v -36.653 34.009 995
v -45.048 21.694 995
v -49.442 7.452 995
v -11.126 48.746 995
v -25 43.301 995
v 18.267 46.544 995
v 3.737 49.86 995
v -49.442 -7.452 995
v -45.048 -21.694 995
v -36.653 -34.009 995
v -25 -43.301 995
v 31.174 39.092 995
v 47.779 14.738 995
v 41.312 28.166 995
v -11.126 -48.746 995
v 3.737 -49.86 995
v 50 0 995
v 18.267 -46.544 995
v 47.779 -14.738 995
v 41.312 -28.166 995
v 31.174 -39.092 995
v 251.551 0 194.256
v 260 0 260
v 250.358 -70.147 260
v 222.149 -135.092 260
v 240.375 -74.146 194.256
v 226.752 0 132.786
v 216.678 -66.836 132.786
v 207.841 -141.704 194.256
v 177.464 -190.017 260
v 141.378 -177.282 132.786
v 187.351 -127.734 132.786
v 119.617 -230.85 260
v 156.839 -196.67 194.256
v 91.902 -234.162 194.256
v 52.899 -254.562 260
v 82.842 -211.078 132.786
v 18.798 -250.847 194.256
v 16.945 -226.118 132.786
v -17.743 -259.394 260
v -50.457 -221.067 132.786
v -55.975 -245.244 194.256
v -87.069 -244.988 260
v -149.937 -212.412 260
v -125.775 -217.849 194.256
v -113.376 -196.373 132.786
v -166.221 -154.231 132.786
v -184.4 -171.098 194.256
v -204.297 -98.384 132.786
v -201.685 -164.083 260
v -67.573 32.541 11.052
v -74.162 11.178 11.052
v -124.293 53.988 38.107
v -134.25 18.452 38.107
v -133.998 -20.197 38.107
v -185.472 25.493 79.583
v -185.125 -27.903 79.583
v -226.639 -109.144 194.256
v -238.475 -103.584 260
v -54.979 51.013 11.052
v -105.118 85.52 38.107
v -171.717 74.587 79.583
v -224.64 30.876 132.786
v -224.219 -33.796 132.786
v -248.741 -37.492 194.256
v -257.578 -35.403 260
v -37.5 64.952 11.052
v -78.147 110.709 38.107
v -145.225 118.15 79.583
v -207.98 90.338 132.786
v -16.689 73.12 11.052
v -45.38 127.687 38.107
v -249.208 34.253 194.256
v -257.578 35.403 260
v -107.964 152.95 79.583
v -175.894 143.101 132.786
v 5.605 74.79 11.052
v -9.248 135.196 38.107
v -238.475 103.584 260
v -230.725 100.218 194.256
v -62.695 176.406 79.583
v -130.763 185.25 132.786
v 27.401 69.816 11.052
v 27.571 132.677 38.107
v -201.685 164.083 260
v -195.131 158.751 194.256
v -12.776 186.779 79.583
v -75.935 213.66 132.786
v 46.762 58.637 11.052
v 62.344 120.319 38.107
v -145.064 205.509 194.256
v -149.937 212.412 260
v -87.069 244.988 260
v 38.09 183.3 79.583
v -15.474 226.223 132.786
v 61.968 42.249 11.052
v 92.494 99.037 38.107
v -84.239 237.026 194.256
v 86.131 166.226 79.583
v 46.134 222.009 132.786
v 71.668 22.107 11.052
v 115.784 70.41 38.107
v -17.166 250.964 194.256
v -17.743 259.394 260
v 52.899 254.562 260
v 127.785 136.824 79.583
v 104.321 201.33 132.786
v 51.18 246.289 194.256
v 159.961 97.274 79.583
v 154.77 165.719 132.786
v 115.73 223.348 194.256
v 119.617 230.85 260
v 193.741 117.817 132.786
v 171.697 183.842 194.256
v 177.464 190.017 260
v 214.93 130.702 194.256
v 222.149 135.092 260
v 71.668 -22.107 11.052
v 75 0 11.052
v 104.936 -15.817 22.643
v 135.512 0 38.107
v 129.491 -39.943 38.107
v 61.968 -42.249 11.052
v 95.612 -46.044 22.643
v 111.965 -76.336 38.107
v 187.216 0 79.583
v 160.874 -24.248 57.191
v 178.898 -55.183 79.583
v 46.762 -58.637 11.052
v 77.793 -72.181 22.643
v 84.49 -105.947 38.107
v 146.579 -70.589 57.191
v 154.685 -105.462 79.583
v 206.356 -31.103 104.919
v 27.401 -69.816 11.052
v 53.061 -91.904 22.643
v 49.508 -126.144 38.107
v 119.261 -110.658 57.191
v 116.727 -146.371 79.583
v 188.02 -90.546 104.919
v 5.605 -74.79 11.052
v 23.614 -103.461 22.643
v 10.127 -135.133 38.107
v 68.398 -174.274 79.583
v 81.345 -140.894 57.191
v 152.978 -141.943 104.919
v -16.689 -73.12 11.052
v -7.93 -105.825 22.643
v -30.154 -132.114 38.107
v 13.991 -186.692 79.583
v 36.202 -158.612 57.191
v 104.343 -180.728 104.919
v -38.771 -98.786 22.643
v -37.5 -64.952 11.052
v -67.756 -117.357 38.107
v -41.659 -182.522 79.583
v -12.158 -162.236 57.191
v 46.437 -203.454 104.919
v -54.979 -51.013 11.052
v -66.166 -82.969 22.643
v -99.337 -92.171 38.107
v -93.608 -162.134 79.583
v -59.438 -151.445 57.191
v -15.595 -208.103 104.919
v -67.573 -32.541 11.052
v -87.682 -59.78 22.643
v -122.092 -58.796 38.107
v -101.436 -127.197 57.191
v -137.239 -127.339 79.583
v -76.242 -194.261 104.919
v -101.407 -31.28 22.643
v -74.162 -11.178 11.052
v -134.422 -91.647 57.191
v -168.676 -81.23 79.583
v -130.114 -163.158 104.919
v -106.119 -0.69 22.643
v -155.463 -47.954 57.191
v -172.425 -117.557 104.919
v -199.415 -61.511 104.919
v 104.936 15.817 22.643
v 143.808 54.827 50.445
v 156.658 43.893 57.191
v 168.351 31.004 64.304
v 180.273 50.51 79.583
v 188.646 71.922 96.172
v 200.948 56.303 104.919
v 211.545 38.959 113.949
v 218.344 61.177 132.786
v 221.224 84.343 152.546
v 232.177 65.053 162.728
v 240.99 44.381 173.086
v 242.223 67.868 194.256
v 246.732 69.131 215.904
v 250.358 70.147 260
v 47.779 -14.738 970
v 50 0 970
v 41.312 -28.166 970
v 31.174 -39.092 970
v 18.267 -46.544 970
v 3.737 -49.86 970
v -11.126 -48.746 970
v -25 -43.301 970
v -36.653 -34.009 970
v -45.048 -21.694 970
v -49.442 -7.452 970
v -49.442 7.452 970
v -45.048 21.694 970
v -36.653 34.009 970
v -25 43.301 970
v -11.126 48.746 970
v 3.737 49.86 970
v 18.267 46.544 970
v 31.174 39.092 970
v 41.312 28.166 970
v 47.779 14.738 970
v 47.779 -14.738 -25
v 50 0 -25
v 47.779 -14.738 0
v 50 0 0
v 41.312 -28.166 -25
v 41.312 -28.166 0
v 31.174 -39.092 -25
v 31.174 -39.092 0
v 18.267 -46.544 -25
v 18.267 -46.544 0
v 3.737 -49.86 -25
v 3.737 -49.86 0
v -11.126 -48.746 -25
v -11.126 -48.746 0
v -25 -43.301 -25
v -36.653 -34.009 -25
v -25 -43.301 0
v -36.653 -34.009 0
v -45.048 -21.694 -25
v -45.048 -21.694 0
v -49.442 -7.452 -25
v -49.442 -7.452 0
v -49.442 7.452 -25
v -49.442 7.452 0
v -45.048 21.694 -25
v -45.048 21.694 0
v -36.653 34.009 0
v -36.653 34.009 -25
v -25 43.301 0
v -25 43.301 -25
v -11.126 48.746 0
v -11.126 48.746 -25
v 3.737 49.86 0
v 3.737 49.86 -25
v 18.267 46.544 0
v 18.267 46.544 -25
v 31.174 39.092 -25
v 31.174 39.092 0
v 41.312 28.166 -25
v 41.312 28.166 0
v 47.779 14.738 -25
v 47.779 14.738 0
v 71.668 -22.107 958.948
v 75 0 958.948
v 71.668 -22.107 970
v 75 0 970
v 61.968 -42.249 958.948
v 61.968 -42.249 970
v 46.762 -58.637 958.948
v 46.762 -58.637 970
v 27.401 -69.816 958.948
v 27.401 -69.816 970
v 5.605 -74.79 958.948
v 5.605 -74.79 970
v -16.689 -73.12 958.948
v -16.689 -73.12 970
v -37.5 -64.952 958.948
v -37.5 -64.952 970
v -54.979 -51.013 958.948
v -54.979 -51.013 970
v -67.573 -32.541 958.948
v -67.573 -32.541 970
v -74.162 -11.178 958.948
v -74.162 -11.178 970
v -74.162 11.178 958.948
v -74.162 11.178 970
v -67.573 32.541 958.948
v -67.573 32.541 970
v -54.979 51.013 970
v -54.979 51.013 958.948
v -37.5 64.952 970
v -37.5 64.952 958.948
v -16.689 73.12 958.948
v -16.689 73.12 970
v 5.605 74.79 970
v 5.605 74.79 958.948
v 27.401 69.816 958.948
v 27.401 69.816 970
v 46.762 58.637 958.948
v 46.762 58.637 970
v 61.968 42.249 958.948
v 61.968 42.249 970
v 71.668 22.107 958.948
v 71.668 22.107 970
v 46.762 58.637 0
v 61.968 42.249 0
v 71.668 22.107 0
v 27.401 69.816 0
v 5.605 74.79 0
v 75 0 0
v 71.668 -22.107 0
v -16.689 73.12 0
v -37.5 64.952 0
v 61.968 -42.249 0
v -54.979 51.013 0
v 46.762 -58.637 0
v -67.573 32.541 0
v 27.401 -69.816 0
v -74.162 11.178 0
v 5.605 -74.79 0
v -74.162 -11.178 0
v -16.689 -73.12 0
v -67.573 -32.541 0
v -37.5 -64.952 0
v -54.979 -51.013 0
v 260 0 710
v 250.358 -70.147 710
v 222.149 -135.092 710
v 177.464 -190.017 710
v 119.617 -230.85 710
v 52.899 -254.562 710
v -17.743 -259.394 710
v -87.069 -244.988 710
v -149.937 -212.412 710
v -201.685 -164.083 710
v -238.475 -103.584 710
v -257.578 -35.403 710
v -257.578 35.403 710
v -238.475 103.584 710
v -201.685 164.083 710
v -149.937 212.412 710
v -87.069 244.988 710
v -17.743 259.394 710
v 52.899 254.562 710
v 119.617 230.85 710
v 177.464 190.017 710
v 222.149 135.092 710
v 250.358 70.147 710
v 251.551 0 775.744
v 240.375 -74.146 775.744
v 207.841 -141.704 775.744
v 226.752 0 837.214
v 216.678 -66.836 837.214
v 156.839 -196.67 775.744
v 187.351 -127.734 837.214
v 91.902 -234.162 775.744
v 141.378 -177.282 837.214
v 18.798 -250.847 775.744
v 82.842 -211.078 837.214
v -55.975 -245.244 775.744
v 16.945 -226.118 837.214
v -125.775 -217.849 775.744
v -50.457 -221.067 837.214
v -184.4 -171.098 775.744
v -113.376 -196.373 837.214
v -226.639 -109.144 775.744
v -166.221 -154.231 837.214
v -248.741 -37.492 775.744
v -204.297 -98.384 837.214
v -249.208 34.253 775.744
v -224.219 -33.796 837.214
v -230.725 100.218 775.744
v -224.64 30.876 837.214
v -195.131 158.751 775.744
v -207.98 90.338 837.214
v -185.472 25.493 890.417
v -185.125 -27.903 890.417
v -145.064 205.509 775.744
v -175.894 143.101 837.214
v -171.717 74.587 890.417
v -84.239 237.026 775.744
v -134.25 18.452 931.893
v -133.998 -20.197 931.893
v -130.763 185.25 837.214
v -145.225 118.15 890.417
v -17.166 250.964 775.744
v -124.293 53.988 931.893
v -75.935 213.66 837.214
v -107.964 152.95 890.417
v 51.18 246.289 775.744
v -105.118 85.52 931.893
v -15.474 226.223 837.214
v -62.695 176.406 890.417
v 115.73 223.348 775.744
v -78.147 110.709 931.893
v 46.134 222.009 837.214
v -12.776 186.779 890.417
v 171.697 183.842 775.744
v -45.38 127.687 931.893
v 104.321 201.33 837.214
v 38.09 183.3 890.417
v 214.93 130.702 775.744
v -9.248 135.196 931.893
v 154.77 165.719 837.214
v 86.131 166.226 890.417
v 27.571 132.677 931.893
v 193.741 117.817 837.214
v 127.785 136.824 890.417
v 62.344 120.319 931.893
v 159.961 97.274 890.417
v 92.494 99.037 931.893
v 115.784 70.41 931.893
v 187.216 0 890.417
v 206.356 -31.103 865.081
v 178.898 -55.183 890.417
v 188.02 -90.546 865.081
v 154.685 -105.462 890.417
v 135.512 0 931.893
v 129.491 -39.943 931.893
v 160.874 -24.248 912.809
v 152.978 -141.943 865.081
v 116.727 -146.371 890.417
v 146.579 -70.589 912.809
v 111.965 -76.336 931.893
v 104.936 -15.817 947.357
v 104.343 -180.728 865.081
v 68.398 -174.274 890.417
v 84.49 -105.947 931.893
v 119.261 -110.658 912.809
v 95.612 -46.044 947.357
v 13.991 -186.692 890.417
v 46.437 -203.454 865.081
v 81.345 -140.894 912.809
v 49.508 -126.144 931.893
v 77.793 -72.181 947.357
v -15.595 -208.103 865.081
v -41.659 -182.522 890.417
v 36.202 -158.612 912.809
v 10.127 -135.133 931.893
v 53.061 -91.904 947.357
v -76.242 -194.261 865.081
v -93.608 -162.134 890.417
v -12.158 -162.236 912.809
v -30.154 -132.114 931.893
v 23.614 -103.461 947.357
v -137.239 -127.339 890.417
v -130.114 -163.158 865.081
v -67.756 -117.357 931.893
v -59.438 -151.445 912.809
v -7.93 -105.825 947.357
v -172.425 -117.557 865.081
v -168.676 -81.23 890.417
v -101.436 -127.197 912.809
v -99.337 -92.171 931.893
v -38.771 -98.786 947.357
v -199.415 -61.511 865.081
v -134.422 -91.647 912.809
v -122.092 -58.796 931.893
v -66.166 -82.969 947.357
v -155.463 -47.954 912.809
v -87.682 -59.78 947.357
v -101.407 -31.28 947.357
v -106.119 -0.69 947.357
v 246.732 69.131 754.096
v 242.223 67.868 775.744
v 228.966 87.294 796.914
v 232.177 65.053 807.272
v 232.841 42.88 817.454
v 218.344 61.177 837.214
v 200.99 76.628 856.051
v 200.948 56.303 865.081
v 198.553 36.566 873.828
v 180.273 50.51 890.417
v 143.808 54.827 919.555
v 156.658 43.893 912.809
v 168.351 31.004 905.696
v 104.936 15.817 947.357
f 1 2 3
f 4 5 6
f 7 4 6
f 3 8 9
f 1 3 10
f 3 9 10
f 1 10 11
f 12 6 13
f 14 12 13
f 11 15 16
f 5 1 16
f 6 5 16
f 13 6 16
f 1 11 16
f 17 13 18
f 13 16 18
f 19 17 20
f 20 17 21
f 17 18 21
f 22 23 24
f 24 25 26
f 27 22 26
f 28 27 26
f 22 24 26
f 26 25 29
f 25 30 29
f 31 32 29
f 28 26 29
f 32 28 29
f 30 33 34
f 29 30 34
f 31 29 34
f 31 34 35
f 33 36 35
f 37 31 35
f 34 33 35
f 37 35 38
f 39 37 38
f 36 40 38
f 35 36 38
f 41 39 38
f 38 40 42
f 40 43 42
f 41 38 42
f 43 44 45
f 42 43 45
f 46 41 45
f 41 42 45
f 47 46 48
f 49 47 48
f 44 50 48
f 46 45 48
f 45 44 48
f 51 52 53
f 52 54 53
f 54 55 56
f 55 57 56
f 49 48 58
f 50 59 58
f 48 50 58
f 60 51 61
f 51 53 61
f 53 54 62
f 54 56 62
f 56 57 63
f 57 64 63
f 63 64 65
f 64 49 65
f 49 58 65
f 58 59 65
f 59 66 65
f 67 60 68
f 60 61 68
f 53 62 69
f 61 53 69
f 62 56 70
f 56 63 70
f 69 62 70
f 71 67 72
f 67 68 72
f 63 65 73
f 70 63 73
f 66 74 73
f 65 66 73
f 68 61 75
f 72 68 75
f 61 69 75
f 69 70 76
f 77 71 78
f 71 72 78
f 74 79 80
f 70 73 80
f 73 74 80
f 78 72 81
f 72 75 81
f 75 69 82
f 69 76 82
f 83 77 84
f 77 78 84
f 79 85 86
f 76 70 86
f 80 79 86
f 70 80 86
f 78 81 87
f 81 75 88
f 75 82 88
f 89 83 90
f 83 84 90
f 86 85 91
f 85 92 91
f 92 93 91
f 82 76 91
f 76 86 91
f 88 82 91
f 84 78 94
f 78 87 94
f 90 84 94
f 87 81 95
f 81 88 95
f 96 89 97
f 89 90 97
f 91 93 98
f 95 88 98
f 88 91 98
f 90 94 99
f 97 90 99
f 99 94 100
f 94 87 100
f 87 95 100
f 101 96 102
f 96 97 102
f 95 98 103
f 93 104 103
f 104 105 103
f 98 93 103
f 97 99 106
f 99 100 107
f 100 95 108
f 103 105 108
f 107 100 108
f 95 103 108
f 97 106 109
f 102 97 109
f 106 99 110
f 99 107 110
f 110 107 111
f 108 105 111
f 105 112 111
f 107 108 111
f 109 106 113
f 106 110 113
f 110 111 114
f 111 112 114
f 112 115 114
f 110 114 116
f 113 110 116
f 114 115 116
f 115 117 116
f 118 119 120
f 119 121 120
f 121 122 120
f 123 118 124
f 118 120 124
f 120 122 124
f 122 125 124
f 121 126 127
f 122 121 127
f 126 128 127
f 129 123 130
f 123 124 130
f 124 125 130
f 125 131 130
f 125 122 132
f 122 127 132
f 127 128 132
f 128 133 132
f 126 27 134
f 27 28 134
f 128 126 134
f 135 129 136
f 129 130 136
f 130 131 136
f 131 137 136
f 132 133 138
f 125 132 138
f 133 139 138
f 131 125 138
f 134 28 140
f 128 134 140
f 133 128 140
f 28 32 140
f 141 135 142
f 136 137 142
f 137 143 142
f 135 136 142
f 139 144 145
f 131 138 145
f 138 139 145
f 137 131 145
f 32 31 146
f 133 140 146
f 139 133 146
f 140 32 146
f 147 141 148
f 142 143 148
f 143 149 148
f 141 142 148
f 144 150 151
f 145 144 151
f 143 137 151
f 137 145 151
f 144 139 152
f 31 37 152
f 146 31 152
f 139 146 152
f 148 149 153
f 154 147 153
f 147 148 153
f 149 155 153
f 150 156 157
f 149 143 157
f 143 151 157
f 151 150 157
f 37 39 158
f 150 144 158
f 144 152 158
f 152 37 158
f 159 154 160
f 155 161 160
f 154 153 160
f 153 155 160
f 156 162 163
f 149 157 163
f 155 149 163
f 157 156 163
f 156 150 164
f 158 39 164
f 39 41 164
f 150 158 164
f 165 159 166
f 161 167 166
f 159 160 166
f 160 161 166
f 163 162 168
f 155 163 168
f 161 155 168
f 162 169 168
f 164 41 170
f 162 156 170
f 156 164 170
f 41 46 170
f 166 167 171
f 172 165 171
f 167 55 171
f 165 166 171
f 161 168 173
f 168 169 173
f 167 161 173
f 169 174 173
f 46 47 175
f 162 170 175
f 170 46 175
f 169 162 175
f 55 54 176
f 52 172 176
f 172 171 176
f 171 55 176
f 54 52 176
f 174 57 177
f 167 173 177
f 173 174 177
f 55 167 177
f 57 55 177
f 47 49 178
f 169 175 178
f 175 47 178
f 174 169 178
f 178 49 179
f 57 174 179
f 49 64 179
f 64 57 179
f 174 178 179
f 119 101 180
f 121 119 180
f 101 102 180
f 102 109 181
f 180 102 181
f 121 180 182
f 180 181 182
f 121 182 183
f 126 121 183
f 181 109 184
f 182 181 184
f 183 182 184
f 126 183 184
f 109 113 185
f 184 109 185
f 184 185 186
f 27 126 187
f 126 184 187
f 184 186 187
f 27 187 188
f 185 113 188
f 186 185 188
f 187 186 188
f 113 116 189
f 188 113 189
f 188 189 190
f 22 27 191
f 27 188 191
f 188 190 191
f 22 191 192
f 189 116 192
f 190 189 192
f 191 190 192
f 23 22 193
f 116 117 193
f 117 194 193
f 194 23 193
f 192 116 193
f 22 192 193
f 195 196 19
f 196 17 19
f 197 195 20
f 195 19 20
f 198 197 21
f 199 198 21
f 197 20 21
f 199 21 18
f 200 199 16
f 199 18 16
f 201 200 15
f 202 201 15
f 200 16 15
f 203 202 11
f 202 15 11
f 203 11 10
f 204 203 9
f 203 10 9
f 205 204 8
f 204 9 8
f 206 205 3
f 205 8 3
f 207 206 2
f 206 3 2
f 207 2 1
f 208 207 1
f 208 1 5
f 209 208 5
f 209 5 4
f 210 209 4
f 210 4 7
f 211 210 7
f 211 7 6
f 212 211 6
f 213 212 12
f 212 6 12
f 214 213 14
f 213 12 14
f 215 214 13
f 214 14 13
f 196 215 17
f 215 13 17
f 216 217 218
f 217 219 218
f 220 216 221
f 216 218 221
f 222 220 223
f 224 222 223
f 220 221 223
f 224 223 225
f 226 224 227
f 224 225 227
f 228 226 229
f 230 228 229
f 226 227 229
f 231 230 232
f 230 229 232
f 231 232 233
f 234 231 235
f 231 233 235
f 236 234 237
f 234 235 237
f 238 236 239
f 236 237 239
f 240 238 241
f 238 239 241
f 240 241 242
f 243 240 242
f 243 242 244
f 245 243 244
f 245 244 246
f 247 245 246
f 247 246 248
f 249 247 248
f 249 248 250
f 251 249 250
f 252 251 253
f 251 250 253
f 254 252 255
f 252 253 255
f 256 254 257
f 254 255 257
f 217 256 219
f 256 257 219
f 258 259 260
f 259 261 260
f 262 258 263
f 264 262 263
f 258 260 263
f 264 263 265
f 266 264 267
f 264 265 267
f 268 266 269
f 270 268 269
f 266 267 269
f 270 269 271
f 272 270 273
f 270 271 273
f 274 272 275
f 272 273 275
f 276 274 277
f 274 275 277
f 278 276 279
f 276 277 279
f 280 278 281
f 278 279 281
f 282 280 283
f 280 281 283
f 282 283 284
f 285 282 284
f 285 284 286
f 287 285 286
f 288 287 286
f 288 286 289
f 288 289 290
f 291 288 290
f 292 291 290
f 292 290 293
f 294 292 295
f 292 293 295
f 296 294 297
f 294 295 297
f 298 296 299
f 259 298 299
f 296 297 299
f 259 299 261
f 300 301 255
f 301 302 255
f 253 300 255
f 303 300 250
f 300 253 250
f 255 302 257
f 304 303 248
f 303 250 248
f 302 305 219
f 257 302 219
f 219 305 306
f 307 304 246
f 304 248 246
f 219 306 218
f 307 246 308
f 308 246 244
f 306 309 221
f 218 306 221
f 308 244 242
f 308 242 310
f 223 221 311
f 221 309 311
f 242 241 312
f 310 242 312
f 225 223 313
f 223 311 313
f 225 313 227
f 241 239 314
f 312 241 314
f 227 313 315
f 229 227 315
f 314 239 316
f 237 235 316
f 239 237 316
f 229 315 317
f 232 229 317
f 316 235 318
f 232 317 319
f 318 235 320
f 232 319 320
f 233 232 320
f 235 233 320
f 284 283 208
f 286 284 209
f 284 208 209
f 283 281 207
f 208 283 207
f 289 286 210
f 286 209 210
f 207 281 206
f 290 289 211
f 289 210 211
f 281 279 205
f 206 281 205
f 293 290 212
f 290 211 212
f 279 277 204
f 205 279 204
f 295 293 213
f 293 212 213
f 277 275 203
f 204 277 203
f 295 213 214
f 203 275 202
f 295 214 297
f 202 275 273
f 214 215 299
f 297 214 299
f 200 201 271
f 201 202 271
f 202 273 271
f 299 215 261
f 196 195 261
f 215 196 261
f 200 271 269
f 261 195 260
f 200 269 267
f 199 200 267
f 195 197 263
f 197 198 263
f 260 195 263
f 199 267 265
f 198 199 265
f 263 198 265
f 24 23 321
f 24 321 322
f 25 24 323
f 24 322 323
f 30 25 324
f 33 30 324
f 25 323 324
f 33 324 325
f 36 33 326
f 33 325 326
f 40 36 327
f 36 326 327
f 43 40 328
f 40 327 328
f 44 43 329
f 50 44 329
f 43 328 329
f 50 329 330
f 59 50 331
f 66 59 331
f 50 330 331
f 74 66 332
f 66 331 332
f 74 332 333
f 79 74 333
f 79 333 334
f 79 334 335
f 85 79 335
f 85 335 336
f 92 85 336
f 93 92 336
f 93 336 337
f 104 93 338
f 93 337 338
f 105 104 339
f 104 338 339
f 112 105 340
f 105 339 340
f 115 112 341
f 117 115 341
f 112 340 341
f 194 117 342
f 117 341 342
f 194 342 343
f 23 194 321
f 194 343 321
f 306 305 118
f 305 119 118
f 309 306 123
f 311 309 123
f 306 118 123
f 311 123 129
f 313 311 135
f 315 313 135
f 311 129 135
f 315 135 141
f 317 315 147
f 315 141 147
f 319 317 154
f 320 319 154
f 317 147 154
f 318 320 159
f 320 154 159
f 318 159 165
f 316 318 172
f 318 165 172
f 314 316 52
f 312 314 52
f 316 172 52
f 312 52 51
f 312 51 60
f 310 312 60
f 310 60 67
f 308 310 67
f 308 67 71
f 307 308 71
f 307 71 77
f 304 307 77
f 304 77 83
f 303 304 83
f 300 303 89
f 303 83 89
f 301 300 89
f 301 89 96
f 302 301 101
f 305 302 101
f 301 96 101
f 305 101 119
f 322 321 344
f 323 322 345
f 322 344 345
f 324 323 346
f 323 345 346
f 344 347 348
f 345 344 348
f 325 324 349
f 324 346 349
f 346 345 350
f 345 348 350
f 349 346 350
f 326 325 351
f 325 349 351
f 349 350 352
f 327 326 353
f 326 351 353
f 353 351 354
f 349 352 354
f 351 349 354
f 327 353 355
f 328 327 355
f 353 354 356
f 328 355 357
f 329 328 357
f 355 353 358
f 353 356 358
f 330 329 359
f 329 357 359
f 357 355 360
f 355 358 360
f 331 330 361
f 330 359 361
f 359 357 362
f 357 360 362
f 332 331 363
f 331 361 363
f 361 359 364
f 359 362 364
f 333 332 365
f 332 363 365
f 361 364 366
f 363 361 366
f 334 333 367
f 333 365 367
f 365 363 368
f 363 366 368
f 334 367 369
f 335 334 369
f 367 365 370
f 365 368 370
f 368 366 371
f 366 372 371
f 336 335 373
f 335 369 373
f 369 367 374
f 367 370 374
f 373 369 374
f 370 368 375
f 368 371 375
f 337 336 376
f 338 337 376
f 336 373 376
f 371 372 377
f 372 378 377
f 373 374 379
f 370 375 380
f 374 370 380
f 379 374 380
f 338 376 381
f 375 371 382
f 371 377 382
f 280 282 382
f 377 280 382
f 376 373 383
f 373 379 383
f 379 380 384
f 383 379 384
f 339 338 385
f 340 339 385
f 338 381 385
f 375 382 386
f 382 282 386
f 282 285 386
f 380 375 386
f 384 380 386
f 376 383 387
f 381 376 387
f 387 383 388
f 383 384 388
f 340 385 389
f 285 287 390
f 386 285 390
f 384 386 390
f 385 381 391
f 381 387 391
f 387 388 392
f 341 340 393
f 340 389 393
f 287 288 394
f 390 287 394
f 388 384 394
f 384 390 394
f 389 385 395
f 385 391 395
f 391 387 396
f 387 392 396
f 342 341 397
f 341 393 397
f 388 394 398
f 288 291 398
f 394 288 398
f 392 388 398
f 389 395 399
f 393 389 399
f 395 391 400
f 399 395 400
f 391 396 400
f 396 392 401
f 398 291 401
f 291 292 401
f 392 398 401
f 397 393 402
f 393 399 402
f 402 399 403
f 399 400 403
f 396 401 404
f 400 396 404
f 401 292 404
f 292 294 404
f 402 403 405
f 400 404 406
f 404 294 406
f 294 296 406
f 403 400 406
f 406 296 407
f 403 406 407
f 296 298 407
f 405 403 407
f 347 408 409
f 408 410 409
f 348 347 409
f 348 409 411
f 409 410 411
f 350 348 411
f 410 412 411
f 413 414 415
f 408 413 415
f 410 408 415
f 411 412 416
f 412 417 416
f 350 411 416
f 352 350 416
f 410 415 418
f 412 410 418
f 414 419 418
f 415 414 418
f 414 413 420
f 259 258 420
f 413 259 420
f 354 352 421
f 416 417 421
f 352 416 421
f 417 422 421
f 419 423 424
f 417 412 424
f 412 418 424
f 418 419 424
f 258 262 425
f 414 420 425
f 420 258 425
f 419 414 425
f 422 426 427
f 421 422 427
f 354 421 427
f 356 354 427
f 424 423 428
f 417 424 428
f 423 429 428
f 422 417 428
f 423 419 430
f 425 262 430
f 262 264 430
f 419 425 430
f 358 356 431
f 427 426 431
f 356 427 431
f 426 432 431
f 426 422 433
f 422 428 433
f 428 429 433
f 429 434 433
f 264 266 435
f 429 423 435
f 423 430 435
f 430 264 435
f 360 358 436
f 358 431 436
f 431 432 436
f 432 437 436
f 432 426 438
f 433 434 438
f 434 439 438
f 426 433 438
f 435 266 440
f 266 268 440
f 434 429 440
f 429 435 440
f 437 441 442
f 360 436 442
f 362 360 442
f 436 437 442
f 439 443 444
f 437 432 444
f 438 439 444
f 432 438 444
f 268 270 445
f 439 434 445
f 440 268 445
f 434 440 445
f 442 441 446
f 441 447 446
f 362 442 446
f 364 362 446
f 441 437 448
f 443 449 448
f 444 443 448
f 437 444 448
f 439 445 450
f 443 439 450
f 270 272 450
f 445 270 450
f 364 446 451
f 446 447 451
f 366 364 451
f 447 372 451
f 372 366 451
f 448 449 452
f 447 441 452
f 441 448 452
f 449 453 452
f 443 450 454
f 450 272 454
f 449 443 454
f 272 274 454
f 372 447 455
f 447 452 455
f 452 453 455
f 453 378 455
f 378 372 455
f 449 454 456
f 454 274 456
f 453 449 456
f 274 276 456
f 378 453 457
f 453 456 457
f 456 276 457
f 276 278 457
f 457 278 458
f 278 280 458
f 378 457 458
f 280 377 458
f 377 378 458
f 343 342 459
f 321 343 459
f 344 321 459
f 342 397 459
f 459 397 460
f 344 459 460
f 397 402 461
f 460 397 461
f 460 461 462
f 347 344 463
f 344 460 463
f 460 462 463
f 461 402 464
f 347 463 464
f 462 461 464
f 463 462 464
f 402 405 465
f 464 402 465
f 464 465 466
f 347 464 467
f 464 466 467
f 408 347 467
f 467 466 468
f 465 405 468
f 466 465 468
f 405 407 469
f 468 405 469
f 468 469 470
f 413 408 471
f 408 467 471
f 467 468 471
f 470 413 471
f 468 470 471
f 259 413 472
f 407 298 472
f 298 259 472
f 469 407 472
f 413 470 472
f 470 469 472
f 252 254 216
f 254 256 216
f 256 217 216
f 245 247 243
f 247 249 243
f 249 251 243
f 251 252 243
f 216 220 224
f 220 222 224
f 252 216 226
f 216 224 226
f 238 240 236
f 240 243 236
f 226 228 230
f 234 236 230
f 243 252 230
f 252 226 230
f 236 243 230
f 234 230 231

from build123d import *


with BuildPart() as f1:
    # F0 (on Front) → F1 (revolve)
    with BuildSketch(Plane.XZ):
        with BuildLine():
            Line((75, 0), (75, 11.052214))
            ThreePointArc((75, 11.052214), (208.686368, 104.919376), (260, 260))
            Line((260, 260), (260, 710))
            ThreePointArc((260, 710), (208.686368, 865.080624), (75, 958.947786))
            Line((75, 958.947786), (75, 970))
            Line((75, 970), (50, 970))
            Line((50, 970), (50, 995))
            Line((50, 995), (0, 995))
            Line((0, 995), (0, 970))
            Line((0, 970), (0, 0))
            Line((0, 0), (0, -25))
            Line((0, -25), (50, -25))
            Line((50, -25), (50, 0))
            Line((50, 0), (75, 0))
        make_face()
    revolve(axis=Axis((0, 0, 485), (0, 0, -1)))


solid = f1.part
